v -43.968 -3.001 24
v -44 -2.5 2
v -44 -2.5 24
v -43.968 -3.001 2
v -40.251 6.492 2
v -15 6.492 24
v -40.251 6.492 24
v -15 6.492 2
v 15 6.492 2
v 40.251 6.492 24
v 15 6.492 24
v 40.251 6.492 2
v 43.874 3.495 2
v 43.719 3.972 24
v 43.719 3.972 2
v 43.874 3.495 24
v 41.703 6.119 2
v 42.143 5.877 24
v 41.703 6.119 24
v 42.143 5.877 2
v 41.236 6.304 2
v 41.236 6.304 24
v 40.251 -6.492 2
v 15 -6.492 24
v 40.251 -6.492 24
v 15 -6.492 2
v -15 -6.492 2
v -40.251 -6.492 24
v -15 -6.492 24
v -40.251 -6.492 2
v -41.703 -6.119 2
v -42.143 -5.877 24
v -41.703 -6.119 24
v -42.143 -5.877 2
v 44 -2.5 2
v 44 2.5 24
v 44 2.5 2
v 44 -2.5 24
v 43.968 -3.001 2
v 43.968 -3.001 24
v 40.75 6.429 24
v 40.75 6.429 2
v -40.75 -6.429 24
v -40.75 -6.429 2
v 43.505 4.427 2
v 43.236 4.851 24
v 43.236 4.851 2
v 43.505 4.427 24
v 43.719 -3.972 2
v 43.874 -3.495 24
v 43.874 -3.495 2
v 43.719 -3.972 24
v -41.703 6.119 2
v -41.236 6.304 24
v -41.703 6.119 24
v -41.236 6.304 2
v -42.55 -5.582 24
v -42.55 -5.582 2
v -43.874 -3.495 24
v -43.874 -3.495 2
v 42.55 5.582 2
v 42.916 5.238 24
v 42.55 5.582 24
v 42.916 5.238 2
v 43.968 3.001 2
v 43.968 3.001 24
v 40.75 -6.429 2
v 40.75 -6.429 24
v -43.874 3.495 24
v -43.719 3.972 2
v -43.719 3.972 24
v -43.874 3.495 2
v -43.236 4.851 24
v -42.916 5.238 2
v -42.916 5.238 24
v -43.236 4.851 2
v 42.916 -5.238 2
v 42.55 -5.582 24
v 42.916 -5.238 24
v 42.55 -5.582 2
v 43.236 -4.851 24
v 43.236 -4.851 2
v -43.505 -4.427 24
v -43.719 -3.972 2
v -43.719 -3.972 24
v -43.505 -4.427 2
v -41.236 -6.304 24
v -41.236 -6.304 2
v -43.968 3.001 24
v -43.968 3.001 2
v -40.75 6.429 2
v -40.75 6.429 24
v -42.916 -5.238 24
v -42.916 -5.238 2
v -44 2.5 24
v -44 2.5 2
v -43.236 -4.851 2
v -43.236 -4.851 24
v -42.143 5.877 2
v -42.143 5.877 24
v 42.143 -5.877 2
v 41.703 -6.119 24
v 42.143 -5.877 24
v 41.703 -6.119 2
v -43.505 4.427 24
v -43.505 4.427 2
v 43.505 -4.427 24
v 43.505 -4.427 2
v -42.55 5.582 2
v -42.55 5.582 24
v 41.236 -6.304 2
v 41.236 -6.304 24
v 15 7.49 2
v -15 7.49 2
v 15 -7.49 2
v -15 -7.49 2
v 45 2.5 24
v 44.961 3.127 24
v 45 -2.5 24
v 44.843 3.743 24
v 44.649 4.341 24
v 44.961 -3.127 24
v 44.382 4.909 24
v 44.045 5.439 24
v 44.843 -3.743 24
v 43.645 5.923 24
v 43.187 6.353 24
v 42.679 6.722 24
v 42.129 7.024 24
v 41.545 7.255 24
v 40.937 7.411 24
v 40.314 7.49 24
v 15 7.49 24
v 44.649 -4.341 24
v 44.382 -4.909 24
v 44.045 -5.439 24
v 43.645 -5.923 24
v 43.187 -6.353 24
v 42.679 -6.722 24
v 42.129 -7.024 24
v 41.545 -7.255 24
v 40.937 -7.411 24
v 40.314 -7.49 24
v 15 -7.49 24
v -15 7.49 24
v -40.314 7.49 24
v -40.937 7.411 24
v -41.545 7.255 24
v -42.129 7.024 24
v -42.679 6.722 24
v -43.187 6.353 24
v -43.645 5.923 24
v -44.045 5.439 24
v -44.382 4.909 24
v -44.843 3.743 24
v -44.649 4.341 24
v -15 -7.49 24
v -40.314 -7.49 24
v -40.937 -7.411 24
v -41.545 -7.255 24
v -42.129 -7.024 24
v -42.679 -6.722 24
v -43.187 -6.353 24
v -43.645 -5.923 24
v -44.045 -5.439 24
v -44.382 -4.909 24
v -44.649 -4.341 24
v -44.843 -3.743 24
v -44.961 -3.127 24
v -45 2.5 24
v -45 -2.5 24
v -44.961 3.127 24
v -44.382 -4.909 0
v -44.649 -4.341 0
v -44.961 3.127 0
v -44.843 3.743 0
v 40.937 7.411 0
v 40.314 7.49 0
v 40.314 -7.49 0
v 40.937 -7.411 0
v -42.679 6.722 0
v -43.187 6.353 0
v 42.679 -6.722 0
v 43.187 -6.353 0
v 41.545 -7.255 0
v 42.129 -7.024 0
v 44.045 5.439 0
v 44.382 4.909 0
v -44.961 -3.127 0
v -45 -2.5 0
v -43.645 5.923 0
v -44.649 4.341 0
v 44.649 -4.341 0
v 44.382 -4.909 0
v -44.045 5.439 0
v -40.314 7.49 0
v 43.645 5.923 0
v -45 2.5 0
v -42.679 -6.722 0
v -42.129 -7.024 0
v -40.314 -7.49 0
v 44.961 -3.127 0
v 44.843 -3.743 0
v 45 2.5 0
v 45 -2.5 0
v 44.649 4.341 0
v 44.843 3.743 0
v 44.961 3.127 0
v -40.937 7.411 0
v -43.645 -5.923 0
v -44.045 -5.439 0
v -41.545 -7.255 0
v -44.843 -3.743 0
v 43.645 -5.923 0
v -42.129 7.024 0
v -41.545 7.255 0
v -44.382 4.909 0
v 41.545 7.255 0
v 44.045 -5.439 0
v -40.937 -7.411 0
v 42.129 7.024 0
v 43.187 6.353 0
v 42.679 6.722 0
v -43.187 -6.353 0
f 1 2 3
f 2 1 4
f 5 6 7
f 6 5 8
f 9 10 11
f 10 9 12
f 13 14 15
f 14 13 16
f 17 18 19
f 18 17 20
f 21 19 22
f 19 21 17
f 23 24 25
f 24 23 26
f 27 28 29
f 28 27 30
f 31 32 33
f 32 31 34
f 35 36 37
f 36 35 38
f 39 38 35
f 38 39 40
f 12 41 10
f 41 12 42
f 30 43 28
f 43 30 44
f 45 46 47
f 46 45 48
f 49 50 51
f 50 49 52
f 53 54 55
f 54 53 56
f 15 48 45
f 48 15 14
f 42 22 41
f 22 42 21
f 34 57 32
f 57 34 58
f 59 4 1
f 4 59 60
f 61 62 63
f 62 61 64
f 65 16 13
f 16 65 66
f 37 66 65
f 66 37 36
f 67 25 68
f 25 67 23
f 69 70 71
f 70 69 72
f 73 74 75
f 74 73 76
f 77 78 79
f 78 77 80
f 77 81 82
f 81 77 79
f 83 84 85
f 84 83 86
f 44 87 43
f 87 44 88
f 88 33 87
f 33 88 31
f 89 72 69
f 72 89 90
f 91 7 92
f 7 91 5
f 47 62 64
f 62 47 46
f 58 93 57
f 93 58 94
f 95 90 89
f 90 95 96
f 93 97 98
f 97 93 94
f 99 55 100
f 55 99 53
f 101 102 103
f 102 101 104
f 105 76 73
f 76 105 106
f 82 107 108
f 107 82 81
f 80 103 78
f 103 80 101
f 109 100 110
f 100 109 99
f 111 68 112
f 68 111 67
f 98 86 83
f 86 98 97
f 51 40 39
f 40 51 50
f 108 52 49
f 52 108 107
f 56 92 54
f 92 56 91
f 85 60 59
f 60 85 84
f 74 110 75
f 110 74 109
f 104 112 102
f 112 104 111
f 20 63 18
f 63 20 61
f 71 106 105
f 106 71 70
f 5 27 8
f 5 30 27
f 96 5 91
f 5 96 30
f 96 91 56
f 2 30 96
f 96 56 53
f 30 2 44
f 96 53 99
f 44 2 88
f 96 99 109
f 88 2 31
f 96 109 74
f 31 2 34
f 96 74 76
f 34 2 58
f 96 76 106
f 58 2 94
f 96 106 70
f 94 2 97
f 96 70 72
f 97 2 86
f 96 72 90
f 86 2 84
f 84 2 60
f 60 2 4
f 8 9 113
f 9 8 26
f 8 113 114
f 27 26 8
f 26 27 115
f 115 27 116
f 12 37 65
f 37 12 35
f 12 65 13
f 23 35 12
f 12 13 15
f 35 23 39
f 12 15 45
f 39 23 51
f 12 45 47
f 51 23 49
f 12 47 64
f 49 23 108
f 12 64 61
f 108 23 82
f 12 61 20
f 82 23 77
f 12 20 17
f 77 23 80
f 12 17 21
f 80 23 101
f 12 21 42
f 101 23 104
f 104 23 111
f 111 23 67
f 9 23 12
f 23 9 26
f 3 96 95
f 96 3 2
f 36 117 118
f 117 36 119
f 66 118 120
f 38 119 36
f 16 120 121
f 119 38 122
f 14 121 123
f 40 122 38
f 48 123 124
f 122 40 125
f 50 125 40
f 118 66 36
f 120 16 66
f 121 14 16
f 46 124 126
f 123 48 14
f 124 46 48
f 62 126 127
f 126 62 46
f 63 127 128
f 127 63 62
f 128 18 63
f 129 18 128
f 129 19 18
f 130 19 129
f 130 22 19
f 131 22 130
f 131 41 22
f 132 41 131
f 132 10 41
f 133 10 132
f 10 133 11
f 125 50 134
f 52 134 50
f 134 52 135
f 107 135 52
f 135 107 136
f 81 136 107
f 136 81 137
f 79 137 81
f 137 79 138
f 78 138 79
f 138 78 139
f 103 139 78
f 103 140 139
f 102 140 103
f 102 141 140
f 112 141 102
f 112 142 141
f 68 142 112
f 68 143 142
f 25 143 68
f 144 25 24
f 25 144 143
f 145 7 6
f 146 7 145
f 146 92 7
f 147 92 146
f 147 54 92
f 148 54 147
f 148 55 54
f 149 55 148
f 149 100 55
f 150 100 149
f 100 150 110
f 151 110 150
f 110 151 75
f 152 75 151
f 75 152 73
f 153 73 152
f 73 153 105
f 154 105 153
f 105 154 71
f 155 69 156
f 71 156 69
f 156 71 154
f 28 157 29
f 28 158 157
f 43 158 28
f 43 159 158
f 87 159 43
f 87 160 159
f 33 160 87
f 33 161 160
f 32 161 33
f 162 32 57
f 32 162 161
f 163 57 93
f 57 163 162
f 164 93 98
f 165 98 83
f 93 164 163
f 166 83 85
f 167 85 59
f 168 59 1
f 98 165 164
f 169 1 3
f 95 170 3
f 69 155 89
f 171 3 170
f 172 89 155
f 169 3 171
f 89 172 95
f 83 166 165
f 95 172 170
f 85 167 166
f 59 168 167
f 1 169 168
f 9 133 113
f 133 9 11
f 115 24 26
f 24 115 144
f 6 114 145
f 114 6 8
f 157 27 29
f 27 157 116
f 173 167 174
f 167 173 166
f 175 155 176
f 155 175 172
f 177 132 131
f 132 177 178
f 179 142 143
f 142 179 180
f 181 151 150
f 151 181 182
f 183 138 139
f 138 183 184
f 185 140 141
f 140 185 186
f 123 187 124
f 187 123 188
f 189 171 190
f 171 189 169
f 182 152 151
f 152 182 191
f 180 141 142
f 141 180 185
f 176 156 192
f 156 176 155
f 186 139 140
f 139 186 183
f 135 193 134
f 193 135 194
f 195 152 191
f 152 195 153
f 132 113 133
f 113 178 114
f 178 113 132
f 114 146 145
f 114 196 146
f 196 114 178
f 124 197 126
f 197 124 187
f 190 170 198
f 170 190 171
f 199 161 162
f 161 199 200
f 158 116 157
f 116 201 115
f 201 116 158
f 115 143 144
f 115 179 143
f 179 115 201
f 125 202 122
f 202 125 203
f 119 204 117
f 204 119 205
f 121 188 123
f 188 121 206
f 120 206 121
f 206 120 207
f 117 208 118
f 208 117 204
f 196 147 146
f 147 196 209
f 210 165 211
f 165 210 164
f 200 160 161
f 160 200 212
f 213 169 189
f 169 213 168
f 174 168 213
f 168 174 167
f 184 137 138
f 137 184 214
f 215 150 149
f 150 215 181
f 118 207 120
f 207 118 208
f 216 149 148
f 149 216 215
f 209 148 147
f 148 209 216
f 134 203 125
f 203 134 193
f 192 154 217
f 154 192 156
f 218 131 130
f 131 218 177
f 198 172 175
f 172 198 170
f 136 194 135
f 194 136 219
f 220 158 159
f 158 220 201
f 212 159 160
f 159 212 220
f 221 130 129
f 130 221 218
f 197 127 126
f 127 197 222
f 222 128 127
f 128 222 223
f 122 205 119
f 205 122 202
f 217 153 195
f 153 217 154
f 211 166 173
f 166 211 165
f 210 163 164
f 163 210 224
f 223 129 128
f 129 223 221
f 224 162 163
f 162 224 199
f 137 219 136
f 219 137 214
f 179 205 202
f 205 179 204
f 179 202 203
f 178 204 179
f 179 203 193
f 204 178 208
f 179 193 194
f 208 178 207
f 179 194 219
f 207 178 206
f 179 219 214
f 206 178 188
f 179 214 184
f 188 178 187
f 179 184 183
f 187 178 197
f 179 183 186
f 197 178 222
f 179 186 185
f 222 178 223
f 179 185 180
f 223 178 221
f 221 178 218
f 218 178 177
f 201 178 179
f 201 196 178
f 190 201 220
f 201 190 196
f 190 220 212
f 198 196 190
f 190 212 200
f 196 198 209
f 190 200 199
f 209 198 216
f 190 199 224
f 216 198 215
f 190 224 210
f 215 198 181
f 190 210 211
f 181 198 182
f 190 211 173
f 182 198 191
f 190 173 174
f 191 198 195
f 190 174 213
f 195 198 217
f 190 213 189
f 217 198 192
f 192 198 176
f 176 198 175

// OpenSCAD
$fn = 50;


difference() {
	union() {
		hull() {
			translate(v = [-40.0000000000, 2.5000000000, 0]) {
				cylinder(h = 24, r = 5);
			}
			translate(v = [40.0000000000, 2.5000000000, 0]) {
				cylinder(h = 24, r = 5);
			}
			translate(v = [-40.0000000000, -2.5000000000, 0]) {
				cylinder(h = 24, r = 5);
			}
			translate(v = [40.0000000000, -2.5000000000, 0]) {
				cylinder(h = 24, r = 5);
			}
		}
	}
	union() {
		translate(v = [0, 0, 2]) {
			hull() {
				translate(v = [-40.0000000000, 2.5000000000, 0]) {
					cylinder(h = 22, r = 4);
				}
				translate(v = [40.0000000000, 2.5000000000, 0]) {
					cylinder(h = 22, r = 4);
				}
				translate(v = [-40.0000000000, -2.5000000000, 0]) {
					cylinder(h = 22, r = 4);
				}
				translate(v = [40.0000000000, -2.5000000000, 0]) {
					cylinder(h = 22, r = 4);
				}
			}
		}
		#translate(v = [-15.0000000000, -15.0000000000, 2]) {
			cube(size = [30, 30, 22]);
		}
	}
}
